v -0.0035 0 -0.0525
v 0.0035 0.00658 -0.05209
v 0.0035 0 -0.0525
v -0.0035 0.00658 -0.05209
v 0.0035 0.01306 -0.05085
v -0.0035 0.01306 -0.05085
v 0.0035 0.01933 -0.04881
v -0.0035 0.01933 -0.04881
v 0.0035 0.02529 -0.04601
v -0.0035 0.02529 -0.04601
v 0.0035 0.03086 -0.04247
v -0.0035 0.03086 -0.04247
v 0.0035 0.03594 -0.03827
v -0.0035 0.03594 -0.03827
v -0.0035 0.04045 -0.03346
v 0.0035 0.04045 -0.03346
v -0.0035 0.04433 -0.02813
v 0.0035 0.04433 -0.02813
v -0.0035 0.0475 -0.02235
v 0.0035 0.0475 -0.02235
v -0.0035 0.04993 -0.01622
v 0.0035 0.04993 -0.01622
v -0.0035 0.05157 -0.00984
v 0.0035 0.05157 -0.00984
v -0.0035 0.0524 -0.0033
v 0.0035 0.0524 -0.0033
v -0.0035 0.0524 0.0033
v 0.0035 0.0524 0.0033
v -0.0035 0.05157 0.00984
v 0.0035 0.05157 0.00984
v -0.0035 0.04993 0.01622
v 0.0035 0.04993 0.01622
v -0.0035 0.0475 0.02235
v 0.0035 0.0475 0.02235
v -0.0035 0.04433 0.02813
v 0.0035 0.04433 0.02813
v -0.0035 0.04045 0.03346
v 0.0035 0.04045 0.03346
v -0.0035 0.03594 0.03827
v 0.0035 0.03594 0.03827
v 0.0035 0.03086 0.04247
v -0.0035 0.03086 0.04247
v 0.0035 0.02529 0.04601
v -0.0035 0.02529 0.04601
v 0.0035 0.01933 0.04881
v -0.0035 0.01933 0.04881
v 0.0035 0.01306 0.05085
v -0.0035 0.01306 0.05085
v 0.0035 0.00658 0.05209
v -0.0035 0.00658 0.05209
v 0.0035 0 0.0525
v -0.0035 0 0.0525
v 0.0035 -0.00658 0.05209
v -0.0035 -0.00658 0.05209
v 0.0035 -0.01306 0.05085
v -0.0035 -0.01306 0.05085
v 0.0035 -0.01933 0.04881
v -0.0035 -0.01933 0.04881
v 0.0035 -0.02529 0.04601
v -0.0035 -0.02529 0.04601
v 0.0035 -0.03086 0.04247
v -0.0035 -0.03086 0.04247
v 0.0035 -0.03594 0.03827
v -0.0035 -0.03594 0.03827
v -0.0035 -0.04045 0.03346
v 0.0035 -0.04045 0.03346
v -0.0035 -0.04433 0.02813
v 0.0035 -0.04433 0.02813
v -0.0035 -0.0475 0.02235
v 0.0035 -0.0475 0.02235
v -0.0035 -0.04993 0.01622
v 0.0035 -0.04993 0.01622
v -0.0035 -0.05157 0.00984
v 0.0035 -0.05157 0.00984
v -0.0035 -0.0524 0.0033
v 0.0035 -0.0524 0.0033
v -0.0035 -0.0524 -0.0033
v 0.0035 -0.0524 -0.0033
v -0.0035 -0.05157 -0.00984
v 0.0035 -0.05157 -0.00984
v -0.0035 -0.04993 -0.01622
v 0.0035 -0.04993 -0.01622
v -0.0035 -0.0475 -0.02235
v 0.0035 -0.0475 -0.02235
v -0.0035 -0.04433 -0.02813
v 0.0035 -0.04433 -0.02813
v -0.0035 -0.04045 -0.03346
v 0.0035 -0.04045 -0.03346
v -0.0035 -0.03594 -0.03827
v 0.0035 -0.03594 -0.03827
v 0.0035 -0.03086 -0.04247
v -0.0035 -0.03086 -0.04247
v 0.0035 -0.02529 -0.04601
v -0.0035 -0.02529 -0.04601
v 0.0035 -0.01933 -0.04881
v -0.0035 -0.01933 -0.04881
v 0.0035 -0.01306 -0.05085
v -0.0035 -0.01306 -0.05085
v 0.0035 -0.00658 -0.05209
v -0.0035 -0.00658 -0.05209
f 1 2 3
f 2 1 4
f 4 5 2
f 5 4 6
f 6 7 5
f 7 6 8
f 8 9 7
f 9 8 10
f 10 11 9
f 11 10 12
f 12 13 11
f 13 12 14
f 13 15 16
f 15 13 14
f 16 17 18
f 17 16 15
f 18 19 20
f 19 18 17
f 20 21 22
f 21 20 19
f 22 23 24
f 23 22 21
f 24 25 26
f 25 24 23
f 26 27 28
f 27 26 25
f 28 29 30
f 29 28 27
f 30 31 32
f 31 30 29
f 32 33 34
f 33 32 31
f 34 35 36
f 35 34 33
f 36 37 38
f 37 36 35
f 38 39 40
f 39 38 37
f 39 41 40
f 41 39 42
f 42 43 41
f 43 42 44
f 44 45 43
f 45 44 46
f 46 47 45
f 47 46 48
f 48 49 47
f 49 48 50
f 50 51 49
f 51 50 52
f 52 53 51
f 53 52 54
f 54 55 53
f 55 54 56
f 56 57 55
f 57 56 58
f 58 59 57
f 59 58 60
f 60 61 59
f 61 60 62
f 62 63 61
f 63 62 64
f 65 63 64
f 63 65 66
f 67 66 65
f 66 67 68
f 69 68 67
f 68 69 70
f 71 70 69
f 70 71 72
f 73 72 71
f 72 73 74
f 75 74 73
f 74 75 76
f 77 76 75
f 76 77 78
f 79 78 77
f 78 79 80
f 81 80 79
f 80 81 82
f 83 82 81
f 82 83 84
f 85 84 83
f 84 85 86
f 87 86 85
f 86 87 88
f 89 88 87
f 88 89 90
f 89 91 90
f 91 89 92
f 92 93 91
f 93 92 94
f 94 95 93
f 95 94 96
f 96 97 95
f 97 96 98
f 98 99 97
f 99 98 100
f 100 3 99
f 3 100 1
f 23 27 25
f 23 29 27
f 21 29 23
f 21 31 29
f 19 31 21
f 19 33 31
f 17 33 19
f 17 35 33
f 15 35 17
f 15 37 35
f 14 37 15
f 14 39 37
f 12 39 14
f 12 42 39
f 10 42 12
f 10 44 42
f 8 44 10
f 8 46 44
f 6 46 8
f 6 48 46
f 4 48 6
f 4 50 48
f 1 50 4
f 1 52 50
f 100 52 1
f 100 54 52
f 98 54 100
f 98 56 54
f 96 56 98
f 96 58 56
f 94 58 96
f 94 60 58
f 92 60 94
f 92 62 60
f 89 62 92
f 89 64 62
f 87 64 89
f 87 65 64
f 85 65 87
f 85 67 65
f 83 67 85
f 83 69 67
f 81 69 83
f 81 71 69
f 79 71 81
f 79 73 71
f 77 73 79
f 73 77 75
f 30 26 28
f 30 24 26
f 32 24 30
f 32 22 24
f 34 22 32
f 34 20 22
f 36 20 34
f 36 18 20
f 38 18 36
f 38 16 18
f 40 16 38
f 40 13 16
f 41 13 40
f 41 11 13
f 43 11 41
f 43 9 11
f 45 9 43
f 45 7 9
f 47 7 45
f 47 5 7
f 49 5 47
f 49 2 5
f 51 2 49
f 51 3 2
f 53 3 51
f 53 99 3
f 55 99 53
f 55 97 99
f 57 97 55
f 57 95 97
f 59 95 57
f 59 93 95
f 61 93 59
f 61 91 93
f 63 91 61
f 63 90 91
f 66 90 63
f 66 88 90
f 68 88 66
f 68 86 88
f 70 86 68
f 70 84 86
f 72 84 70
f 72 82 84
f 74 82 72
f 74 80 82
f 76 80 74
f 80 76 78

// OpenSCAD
$fn=50;  // REMOVE
PARAM1 = 0.15; // REMOVE
DO = 0.07; // REMOVE
LENGTH = 0.02; // REMOVE
rotate([0,90,0]) cylinder(h=(DO)*0.1, r=(DO)*1.5/2, center=true);
